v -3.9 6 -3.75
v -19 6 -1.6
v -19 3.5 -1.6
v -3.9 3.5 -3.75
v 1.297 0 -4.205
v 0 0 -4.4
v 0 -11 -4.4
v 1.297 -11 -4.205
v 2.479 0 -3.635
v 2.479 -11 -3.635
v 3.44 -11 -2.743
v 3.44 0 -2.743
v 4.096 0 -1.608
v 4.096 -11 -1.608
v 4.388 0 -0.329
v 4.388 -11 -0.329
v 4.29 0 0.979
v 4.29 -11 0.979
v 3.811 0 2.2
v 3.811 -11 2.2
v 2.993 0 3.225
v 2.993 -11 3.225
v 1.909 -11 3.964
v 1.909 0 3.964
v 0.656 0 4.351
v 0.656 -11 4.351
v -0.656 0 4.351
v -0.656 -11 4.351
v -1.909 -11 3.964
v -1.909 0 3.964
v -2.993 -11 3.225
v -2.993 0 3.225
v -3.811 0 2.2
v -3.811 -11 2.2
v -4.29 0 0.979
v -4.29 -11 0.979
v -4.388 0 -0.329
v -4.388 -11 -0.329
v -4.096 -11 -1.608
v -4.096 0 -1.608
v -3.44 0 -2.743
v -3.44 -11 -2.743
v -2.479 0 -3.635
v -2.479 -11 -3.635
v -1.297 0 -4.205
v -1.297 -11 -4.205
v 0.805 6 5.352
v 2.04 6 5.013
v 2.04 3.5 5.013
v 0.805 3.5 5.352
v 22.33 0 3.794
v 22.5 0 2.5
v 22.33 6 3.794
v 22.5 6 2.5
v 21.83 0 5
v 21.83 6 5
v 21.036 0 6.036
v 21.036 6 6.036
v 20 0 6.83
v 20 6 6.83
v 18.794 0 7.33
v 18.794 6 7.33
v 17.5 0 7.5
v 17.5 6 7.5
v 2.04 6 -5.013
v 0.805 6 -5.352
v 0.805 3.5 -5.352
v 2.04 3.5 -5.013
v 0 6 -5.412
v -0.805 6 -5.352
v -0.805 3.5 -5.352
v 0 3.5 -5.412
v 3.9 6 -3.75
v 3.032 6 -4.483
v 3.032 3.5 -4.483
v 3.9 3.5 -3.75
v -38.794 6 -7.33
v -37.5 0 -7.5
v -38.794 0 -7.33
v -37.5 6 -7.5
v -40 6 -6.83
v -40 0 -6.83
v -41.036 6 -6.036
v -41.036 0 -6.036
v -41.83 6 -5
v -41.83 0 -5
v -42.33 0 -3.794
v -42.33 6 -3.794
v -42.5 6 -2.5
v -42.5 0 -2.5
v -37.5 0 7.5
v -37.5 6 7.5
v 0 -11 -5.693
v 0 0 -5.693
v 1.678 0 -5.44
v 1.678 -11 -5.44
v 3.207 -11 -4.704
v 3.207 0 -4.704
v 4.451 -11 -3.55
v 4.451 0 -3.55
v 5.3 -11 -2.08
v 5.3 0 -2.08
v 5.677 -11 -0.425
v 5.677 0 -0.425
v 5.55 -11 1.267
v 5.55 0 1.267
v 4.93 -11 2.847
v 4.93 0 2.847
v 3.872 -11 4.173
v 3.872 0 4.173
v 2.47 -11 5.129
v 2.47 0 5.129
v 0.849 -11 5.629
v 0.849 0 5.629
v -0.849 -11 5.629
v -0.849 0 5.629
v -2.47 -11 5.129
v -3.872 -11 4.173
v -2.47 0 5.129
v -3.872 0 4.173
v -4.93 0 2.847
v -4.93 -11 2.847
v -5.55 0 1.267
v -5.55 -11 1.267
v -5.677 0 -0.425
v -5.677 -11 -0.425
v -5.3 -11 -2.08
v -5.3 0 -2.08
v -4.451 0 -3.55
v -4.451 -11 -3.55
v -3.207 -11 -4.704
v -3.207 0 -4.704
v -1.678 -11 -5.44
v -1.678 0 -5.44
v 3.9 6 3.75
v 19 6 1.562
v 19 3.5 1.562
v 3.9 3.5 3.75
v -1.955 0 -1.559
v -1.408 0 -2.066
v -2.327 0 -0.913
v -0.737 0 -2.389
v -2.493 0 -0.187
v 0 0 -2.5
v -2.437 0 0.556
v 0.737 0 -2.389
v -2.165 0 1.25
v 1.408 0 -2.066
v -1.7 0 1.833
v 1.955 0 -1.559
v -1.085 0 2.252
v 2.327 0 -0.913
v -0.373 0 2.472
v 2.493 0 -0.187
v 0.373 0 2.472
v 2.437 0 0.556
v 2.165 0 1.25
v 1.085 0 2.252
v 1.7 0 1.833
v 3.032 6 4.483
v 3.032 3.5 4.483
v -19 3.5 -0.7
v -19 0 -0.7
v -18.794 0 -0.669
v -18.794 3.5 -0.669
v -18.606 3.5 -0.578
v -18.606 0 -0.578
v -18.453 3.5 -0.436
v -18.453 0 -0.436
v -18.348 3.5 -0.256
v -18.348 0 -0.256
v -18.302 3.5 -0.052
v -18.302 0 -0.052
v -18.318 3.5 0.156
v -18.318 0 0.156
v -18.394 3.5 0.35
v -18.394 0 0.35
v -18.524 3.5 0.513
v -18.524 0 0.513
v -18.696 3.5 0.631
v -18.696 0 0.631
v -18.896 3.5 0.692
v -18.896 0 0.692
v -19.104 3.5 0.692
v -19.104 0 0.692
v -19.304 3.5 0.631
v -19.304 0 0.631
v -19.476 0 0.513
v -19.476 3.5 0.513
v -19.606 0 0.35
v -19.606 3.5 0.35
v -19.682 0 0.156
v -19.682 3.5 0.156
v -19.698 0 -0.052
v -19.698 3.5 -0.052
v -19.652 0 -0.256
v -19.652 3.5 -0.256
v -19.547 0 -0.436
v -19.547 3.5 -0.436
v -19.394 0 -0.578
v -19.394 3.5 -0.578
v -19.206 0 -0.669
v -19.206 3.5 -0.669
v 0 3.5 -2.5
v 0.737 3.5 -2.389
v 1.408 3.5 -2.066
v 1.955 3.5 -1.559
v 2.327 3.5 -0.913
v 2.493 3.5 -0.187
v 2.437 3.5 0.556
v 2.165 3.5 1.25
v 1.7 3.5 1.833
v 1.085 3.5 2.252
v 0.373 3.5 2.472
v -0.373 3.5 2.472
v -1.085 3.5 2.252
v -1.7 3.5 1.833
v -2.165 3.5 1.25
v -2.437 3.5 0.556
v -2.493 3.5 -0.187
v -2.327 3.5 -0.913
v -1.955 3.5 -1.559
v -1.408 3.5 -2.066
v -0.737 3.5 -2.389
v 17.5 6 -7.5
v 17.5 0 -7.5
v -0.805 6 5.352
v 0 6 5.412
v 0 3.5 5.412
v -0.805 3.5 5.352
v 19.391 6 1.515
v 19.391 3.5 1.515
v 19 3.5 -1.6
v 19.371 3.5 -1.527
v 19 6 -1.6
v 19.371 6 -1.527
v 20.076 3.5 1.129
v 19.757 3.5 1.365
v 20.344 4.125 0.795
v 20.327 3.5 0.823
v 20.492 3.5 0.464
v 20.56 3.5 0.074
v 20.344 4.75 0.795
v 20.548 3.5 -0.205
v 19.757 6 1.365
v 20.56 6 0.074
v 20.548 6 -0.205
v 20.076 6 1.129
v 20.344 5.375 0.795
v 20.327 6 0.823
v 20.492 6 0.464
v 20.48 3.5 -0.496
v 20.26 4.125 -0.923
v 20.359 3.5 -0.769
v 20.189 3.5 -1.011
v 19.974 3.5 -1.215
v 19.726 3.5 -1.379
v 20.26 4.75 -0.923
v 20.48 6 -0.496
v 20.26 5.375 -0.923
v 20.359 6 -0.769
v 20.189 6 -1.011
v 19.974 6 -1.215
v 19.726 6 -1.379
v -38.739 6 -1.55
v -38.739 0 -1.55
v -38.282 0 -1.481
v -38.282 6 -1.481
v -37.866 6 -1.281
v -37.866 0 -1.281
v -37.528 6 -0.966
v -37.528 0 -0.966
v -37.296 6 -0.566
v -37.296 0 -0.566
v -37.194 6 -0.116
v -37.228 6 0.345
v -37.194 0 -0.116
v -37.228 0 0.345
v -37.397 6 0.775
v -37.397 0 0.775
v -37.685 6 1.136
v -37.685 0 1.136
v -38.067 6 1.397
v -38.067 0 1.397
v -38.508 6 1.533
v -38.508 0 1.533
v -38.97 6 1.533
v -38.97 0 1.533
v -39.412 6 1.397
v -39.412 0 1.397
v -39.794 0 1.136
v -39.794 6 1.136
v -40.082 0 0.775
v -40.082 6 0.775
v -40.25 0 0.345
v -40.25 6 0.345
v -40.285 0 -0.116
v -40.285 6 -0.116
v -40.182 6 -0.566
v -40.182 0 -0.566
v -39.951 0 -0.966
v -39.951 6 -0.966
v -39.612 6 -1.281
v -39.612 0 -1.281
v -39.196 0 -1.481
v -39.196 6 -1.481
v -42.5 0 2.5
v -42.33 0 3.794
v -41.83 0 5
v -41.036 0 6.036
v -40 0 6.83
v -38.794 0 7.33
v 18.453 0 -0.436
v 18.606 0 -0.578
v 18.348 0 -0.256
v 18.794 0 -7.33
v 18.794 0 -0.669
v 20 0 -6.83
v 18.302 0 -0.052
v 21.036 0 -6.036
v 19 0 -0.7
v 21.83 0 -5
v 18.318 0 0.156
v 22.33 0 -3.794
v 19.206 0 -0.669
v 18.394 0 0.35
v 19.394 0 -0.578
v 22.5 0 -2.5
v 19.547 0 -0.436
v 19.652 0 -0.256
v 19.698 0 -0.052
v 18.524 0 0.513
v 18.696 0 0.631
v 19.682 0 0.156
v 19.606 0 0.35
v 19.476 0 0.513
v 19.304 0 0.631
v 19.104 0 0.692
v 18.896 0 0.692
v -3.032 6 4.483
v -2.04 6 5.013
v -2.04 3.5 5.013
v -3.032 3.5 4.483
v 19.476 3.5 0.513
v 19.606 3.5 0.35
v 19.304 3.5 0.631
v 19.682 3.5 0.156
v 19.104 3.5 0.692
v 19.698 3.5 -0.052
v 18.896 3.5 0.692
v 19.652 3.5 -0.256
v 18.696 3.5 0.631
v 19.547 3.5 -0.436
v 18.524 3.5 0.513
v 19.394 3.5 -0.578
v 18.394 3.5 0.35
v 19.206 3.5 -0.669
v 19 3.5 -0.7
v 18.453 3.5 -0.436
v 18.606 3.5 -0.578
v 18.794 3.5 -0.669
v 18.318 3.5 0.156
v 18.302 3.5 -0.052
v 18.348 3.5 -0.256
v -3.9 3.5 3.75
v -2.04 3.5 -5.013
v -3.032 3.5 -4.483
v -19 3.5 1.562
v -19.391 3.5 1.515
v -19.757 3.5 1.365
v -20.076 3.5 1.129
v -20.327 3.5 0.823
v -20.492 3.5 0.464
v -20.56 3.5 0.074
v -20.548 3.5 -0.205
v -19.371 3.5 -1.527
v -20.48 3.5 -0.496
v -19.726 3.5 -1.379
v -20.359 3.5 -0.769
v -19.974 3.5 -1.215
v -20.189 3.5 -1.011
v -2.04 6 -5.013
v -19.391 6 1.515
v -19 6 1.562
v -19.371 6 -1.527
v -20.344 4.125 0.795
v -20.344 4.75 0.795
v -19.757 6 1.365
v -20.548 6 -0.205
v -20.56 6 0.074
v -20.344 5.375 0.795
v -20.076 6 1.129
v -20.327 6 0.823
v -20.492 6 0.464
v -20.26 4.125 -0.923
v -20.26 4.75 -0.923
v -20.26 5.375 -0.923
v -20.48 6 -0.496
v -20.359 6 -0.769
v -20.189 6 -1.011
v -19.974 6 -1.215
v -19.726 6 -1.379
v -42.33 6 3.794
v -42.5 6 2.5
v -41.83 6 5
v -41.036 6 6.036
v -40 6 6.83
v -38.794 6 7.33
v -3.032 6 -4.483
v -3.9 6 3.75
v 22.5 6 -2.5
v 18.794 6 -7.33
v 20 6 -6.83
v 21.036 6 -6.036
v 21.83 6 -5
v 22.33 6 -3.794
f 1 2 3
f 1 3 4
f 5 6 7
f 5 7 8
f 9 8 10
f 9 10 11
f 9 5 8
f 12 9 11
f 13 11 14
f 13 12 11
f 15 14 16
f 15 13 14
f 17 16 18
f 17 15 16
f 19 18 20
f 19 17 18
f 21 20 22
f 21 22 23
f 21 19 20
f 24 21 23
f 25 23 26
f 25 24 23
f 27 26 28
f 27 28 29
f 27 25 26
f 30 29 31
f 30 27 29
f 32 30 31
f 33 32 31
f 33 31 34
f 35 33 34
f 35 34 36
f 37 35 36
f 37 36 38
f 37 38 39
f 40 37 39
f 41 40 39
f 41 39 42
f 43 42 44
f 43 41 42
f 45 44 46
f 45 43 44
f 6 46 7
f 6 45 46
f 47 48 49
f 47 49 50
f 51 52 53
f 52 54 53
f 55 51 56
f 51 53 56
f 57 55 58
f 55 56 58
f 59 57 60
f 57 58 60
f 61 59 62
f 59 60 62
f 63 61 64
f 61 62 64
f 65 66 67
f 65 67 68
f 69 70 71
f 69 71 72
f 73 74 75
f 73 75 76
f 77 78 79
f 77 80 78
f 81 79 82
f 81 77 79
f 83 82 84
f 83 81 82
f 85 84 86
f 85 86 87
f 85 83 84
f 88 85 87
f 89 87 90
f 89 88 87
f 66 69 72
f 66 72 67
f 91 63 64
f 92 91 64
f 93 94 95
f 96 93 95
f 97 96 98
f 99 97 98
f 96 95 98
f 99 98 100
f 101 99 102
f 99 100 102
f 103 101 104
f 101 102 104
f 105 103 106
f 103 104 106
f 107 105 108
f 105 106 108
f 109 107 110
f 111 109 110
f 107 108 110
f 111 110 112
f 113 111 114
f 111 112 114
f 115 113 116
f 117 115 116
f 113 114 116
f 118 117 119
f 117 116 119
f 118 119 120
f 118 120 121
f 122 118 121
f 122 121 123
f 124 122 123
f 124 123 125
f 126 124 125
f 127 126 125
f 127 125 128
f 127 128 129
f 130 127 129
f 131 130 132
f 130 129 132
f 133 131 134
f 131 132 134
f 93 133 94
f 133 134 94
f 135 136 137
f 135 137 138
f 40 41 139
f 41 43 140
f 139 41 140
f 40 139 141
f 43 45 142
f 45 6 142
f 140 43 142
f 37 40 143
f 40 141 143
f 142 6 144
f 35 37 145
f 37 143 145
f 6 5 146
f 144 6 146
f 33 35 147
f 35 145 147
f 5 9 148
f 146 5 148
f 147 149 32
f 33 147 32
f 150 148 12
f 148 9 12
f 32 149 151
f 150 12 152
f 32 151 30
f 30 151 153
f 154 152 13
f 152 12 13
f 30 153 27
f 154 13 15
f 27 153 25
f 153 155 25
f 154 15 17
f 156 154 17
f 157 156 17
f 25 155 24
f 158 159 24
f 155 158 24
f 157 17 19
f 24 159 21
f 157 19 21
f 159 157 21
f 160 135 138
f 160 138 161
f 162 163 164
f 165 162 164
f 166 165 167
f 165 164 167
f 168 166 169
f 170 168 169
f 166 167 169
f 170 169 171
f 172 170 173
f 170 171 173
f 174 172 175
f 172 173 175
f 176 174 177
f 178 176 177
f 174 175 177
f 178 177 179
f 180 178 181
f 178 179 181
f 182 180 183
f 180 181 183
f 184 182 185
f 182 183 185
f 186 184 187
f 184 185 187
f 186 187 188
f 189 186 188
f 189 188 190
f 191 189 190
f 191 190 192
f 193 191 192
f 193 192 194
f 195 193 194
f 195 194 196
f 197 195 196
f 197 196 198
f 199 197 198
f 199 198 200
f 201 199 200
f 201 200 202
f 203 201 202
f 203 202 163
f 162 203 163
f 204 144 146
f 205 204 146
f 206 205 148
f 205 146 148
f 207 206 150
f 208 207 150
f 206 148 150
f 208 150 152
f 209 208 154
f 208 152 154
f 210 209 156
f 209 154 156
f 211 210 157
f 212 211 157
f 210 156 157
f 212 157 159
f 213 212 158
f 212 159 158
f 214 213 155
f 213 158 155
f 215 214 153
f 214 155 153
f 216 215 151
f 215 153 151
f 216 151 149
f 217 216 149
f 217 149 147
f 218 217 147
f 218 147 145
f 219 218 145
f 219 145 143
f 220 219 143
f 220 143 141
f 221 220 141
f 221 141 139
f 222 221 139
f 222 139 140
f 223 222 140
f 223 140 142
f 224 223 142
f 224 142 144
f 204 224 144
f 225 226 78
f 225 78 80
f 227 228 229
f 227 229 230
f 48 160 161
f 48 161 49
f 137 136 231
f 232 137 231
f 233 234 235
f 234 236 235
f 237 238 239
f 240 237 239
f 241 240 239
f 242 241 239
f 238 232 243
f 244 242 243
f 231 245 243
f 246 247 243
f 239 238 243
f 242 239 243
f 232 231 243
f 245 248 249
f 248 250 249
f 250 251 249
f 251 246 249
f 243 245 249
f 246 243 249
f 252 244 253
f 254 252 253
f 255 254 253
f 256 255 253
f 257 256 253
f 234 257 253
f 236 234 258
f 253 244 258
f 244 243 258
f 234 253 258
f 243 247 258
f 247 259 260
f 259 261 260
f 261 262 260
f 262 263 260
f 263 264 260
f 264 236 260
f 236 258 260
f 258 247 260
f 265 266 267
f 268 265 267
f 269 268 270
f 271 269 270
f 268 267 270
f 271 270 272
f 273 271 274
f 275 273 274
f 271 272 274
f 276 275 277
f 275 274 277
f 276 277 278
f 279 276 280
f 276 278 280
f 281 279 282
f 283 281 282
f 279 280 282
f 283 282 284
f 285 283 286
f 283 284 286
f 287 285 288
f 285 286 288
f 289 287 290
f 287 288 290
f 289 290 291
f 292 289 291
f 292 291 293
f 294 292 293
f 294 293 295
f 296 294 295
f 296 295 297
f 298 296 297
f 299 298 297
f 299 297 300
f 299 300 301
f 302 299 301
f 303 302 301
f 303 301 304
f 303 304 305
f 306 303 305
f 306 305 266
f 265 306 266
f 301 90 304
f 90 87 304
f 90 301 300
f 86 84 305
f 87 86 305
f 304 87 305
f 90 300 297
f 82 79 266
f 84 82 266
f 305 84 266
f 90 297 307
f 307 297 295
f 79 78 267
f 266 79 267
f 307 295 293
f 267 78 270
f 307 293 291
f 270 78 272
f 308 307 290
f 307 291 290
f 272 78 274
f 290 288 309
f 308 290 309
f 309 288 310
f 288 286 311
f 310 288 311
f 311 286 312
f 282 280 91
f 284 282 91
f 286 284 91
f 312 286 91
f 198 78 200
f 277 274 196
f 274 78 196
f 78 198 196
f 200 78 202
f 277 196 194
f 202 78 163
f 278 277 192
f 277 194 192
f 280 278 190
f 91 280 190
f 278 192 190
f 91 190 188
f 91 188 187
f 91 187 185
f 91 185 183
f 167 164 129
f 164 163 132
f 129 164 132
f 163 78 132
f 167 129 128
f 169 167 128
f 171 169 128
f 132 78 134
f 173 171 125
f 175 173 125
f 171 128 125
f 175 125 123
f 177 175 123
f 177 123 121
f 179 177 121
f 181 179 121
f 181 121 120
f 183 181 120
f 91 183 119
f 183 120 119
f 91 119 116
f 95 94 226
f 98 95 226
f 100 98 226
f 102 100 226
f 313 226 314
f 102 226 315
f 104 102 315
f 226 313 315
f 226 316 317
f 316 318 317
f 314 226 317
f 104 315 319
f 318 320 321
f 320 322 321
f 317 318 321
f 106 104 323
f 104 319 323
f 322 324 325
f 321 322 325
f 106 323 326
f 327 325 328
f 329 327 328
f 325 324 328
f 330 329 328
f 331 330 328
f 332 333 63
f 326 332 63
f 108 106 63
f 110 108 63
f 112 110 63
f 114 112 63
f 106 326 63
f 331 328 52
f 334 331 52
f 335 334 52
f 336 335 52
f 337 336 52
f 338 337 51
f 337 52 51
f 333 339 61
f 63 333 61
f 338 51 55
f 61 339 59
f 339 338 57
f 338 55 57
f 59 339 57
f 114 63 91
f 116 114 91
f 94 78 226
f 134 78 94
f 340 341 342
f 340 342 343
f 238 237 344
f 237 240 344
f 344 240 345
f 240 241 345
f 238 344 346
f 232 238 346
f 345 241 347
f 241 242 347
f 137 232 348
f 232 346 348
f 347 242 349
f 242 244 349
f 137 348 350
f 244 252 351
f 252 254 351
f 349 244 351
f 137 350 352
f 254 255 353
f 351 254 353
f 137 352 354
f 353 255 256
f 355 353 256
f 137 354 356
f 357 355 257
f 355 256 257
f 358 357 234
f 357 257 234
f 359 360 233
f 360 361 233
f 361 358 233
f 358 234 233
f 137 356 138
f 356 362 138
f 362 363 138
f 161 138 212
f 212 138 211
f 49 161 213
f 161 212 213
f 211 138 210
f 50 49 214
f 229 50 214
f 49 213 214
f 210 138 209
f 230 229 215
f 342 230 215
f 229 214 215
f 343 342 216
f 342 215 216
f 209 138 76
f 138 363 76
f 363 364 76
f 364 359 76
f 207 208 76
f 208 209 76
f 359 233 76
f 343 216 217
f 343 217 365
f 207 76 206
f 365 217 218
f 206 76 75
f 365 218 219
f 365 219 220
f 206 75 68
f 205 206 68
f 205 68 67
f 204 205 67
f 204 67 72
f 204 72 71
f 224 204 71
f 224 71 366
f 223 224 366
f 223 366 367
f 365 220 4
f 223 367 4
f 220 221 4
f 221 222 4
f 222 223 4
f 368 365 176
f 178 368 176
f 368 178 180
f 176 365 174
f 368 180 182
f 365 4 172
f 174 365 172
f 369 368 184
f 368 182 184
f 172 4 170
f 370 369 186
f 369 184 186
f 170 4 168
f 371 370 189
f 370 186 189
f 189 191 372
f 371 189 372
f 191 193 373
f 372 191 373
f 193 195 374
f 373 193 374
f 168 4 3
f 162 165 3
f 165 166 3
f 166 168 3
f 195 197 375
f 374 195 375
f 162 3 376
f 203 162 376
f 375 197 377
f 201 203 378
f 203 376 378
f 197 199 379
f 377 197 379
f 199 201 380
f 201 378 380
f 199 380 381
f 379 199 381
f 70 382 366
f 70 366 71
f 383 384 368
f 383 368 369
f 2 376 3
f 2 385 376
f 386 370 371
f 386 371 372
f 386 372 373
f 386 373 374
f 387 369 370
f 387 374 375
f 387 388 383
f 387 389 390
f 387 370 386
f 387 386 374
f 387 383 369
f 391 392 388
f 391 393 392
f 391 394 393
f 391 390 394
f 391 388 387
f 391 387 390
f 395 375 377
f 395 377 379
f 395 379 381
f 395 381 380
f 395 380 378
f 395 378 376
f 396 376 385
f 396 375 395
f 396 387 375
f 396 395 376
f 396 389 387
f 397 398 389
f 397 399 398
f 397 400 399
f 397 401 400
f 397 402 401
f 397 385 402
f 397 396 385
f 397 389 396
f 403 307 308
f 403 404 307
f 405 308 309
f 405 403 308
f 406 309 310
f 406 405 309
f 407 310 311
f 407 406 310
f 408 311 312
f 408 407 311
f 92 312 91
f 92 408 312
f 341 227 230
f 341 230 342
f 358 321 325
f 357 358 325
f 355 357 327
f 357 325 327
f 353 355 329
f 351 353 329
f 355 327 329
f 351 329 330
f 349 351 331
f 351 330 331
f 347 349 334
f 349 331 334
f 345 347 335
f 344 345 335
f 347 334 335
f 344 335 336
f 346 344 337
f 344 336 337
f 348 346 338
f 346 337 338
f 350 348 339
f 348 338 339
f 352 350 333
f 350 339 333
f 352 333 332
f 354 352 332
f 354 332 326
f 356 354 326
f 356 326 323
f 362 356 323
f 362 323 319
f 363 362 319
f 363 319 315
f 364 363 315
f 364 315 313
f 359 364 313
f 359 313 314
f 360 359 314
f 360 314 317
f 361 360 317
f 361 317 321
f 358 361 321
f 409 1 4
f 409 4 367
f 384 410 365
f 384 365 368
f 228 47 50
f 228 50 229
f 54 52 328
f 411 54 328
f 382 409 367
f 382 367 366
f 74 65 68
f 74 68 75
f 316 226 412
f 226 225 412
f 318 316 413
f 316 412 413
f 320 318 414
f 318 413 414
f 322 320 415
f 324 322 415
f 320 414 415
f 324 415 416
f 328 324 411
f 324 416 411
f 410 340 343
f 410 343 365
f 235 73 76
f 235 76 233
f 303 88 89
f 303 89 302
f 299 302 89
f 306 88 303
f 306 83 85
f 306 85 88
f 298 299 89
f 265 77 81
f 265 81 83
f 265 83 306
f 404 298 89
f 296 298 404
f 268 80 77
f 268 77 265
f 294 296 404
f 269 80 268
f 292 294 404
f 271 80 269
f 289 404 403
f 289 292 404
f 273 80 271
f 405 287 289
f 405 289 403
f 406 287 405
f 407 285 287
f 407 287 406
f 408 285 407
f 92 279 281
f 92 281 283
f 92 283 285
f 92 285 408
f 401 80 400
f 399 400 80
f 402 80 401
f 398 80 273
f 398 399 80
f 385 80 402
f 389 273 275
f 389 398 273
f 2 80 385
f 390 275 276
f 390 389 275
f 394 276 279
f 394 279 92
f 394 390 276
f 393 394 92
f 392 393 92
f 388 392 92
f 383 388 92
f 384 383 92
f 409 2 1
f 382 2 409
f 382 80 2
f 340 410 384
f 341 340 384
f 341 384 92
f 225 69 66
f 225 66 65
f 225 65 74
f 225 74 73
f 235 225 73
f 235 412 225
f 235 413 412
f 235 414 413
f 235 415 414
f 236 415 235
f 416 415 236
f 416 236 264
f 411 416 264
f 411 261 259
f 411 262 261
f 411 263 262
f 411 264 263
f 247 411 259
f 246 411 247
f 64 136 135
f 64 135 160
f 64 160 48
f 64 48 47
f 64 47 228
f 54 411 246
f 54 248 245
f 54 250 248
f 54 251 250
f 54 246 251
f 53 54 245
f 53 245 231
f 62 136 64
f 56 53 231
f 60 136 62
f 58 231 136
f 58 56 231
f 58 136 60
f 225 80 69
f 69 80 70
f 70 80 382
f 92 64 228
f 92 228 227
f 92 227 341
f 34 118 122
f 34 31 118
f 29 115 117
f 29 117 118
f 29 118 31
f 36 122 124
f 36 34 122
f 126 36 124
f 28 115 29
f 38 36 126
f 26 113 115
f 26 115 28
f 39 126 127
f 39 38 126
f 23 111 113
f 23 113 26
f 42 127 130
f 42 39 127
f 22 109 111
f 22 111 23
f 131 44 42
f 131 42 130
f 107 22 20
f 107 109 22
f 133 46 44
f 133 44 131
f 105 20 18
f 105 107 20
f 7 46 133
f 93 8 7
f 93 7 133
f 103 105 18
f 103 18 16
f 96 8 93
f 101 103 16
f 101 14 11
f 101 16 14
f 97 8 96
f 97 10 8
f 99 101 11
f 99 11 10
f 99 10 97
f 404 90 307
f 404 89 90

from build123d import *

# Parameters (mm, degrees)
ESQUISSE1_W             = 45
ESQUISSE1_H             = 15
BOSS_EXTRU_1_DEPTH      = 6
ESQUISSE2_R             = 2.5
ENL_V_MAT_EXTRU_1_DEPTH = 6
ESQUISSE4_R             = 0.7
ENL_V_MAT_EXTRU_2_DEPTH = 7
ENL_V_MAT_EXTRU_3_DEPTH = 2.5
ESQUISSE7_W             = 15
ESQUISSE7_H             = 6
BOSS_EXTRU_2_DEPTH      = 20
ESQUISSE8_R             = 1.55
ENL_V_MAT_EXTRU_4_DEPTH = 7.5
CONG_1_R                = 5
ESQUISSE9_R             = 5.693069504
ESQUISSE9_R_2           = 4.4
BOSS_EXTRU_3_DEPTH      = 11


with BuildPart() as part:
    # Esquisse1 → Boss.-Extru.1 (new body)
    with BuildSketch(Plane(origin=(0, 0, 0), x_dir=(1, 0, 0), z_dir=(0, 1, 0))):
        Rectangle(ESQUISSE1_W, ESQUISSE1_H)
    extrude(amount=BOSS_EXTRU_1_DEPTH)

    # Esquisse2 → Enlèv. mat.-Extru.1 (cut)
    with BuildSketch(Plane.XZ):
        with Locations(Location((0, 0, 0), (0, 0, 270))):
            Circle(ESQUISSE2_R)
    extrude(amount=-ENL_V_MAT_EXTRU_1_DEPTH, mode=Mode.SUBTRACT)

    # Esquisse4 → Enlèv. mat.-Extru.2 (cut)
    with BuildSketch(Plane.XZ):
        with Locations(Location((19, 0, 0), (0, 0, 270))):
            Circle(ESQUISSE4_R)
        with Locations(Location((-19, 0, 0), (0, 0, 270))):
            Circle(ESQUISSE4_R)
    extrude(amount=-ENL_V_MAT_EXTRU_2_DEPTH, mode=Mode.SUBTRACT)

    # Esquisse3 → Enlèv. mat.-Extru.3 (cut)
    with BuildSketch(Plane(origin=(0, 6, 0), x_dir=(1, 0, 0), z_dir=(0, 1, 0))):
        with BuildLine():
            Line((19, -1.561713939), (3.9, -3.75))
            Line((3.9, -3.75), (3.031885991, -4.483073583))
            Line((3.031885991, -4.483073583), (2.039673068, -5.012984659))
            Line((2.039673068, -5.012984659), (0.804642856, -5.351899783))
            Line((0.804642856, -5.351899783), (0, -5.41204965))
            Line((0, -5.41204965), (-0.804642856, -5.351899783))
            Line((-0.804642856, -5.351899783), (-2.039673068, -5.012984659))
            Line((-2.039673068, -5.012984659), (-3.031885991, -4.483073583))
            Line((-3.031885991, -4.483073583), (-3.9, -3.75))
            Line((-3.9, -3.75), (-19, -1.561713939))
            add(Edge.make_bspline(
                [(-19, -1.561713939), (-19.54064696, -1.574730153), (-20.339297961, -1.094989964), (-20.651707254, 0.047472401), (-20.293588536, 1.158800051), (-19.477708587, 1.555954085), (-19, 1.6)],
                knots=[0, 0, 0, 0, 0.329484693, 0.499358548, 0.699444054, 1, 1, 1, 1], degree=3))
            Line((-19, 1.6), (-3.9, 3.75))
            Line((-3.9, 3.75), (-3.031885991, 4.483073583))
            Line((-3.031885991, 4.483073583), (-2.039673068, 5.012984659))
            Line((-2.039673068, 5.012984659), (-0.804642856, 5.351899783))
            Line((-0.804642856, 5.351899783), (0, 5.41204965))
            Line((0, 5.41204965), (0.804642856, 5.351899783))
            Line((0.804642856, 5.351899783), (2.039673068, 5.012984659))
            Line((2.039673068, 5.012984659), (3.031885991, 4.483073583))
            Line((3.031885991, 4.483073583), (3.9, 3.75))
            Line((3.9, 3.75), (19, 1.6))
            add(Edge.make_bspline(
                [(19, -1.561713939), (19.54064696, -1.574730153), (20.339297961, -1.094989964), (20.651707254, 0.047472401), (20.293588536, 1.158800051), (19.477708587, 1.555954085), (19, 1.6)],
                knots=[0, 0, 0, 0, 0.329484693, 0.499358548, 0.699444054, 1, 1, 1, 1], degree=3))
        make_face()
    extrude(amount=-ENL_V_MAT_EXTRU_3_DEPTH, mode=Mode.SUBTRACT)

    # Esquisse7 → Boss.-Extru.2 (add)
    with BuildSketch(Plane.ZY.offset(22.5)):
        with Locations((0, 3)):
            Rectangle(ESQUISSE7_W, ESQUISSE7_H)
    extrude(amount=BOSS_EXTRU_2_DEPTH)

    # Esquisse8 → Enlèv. mat.-Extru.4 (cut)
    with BuildSketch(Plane.XZ):
        with Locations(Location((-38.739352064, 0, 0), (0, 0, 270))):
            Circle(ESQUISSE8_R)
    extrude(amount=-ENL_V_MAT_EXTRU_4_DEPTH, mode=Mode.SUBTRACT)

    # Congé1
    cong_1_edges = [part.edges().sort_by_distance(p)[0] for p in [
        (22.5, 3, 7.5),
        (22.5, 3, -7.5),
        (-42.5, 3, -7.5),
        (-42.5, 3, 7.5),
    ]]
    fillet(cong_1_edges, radius=CONG_1_R)

    # Esquisse9 → Boss.-Extru.3 (add)
    with BuildSketch(Plane.XZ):
        with Locations(Location((0, 0, 0), (0, 0, 270))):
            Circle(ESQUISSE9_R)
        with Locations(Location((0, 0, 0), (0, 0, 270))):
            Circle(ESQUISSE9_R_2, mode=Mode.SUBTRACT)
    extrude(amount=BOSS_EXTRU_3_DEPTH)


solid = part.part
